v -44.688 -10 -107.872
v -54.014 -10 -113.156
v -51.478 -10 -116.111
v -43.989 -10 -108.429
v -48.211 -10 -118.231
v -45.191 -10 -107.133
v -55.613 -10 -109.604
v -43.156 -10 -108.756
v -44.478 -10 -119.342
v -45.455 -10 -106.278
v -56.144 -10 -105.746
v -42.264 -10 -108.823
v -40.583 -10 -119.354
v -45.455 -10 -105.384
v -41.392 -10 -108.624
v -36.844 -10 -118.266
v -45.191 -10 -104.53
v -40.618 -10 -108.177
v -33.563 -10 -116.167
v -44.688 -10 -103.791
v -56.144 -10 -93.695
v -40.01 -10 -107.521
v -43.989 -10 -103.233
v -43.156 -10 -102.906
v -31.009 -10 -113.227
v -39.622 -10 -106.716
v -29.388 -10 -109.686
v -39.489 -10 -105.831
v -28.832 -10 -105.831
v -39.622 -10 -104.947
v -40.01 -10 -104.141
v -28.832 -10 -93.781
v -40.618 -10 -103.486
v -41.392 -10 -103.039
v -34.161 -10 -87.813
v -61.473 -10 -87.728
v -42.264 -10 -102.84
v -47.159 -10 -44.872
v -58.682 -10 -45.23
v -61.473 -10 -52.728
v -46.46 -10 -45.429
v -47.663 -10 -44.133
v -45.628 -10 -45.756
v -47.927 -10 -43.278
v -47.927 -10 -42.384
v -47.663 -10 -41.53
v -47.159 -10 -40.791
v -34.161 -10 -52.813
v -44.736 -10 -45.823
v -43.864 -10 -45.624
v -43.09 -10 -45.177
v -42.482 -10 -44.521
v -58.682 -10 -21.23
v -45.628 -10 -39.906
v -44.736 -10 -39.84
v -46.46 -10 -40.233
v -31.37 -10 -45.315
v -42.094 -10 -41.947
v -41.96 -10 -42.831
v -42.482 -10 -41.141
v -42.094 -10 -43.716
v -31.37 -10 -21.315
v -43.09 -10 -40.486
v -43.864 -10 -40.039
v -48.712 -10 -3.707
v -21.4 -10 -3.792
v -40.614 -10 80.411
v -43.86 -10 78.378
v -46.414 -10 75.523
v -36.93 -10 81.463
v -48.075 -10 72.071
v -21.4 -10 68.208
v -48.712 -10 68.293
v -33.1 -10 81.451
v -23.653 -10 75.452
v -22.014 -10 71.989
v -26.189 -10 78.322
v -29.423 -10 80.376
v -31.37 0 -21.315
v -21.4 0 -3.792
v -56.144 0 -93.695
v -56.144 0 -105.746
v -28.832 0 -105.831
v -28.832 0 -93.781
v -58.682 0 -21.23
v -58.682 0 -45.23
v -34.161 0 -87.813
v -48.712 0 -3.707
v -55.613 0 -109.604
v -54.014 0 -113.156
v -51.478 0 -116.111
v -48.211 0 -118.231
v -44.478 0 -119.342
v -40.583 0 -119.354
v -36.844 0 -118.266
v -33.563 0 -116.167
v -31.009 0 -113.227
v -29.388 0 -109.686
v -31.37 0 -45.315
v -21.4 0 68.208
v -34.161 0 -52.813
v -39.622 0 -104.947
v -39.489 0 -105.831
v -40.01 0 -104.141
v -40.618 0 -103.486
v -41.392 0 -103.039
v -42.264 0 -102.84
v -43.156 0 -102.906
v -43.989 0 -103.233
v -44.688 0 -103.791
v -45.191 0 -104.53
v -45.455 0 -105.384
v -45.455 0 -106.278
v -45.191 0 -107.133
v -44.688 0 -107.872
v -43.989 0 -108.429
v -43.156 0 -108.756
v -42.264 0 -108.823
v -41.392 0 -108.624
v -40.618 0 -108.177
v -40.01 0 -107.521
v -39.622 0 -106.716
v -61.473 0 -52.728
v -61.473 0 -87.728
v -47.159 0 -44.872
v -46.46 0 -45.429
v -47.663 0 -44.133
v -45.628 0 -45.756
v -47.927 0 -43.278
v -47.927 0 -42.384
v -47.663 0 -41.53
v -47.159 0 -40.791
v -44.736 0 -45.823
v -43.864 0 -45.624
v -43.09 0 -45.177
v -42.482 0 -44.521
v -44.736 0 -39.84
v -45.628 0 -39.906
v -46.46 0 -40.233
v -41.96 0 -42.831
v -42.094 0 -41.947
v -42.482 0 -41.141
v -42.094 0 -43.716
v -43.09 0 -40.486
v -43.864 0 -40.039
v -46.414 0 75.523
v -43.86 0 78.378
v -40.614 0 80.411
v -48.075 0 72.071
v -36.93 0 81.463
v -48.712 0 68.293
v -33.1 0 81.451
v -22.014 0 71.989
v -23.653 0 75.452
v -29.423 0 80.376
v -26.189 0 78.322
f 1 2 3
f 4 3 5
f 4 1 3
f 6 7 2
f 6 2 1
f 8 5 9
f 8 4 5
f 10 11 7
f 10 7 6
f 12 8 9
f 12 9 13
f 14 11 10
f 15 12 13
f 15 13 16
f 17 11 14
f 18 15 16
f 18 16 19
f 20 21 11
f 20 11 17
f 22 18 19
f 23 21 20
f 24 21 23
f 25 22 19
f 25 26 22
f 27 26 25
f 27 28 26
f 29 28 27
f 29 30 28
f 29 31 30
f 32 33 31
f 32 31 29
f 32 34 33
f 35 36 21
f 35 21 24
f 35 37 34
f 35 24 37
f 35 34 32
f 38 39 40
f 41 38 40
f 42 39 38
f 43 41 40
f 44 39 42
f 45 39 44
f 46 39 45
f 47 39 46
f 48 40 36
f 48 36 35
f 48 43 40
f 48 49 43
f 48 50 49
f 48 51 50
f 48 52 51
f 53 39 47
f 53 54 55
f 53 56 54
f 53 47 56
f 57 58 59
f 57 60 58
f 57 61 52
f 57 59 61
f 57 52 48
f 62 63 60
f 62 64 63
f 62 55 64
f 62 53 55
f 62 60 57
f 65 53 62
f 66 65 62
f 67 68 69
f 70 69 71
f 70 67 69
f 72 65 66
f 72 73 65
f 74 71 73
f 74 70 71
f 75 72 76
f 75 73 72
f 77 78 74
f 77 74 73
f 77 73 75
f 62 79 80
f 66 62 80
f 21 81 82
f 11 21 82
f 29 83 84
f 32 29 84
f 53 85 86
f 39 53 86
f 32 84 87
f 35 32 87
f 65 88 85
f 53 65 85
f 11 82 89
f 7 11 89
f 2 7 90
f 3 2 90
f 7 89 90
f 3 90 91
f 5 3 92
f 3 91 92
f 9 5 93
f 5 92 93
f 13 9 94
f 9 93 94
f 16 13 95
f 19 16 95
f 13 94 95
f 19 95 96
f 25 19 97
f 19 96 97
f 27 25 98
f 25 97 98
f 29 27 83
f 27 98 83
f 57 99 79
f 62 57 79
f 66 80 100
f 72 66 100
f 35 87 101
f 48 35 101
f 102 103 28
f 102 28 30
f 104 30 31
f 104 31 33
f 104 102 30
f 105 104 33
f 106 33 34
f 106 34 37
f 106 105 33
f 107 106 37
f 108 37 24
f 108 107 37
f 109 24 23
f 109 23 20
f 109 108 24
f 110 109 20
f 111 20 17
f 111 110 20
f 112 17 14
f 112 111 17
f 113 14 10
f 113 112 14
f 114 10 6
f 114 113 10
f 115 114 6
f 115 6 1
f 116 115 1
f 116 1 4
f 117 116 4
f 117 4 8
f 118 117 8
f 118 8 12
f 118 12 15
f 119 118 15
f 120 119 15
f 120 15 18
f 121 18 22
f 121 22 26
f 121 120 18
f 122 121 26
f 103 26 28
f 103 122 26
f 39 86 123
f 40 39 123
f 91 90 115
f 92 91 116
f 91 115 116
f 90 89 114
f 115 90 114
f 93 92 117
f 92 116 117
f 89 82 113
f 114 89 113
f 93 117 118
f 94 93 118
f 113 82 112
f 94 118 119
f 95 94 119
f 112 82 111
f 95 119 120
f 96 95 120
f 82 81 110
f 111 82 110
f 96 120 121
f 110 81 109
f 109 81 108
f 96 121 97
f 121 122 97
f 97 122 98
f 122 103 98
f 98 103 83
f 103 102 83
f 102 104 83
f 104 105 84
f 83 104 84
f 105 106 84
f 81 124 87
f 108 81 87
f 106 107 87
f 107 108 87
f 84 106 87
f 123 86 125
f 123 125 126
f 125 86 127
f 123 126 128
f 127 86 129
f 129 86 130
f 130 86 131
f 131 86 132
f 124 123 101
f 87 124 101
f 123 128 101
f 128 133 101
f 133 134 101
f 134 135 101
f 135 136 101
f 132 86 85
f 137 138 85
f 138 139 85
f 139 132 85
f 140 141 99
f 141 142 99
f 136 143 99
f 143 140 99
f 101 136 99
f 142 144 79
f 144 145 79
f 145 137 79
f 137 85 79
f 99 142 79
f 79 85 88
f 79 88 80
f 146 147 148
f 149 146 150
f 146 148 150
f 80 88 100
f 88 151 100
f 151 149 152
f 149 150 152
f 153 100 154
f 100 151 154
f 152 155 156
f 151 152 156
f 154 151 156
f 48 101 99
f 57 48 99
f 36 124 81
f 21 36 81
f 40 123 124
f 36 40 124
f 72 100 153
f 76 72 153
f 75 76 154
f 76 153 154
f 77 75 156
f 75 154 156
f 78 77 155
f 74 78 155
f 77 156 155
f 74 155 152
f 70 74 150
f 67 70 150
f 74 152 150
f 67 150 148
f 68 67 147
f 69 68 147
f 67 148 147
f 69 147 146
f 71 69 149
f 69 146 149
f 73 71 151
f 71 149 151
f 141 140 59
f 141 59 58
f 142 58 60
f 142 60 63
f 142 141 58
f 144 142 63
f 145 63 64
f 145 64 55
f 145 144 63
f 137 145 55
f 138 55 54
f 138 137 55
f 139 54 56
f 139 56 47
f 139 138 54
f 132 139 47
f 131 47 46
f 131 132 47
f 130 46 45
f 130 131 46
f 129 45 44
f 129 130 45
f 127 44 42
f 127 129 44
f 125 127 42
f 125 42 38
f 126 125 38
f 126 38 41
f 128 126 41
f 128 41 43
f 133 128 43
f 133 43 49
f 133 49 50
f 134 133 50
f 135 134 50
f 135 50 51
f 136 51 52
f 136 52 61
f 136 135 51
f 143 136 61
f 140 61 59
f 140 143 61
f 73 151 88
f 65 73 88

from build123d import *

# Parameters (mm, degrees)
F0_R     = 3
F1_DEPTH = 10


with BuildPart() as f1:
    # F0 (on Front) → F1 (new body)
    with BuildSketch(Plane.XZ):
        with BuildLine():
            ThreePointArc((-21.40014, 68.208159), (-35.014491, 81.592238), (-48.712137, 68.293419))
            Line((-48.712137, 68.293419), (-48.712137, -3.706581))
            Line((-48.712137, -3.706581), (-58.68246, -21.230183))
            Line((-58.68246, -21.230183), (-58.68246, -45.230183))
            Line((-58.68246, -45.230183), (-61.472507, -52.727892))
            Line((-61.472507, -52.727892), (-61.472507, -87.727892))
            Line((-61.472507, -87.727892), (-56.144382, -93.695394))
            Line((-56.144382, -93.695394), (-56.144382, -105.746023))
            ThreePointArc((-56.144382, -105.746023), (-42.531147, -119.487347), (-28.832385, -105.831283))
            Line((-28.832385, -105.831283), (-28.832385, -93.780654))
            Line((-28.832385, -93.780654), (-34.160511, -87.813152))
            Line((-34.160511, -87.813152), (-34.160511, -52.813152))
            Line((-34.160511, -52.813152), (-31.370464, -45.315443))
            Line((-31.370464, -45.315443), (-31.370464, -21.315443))
            Line((-31.370464, -21.315443), (-21.40014, -3.791841))
            Line((-21.40014, -3.791841), (-21.40014, 67.656904))
            Line((-21.40014, 67.656904), (-21.40014, 68.208159))
        make_face()
        with Locations((-42.488516, -105.831283)):
            Circle(F0_R, mode=Mode.SUBTRACT)
        with Locations((-44.960245, -42.831283)):
            Circle(F0_R, mode=Mode.SUBTRACT)
    extrude(amount=F1_DEPTH)


solid = f1.part
